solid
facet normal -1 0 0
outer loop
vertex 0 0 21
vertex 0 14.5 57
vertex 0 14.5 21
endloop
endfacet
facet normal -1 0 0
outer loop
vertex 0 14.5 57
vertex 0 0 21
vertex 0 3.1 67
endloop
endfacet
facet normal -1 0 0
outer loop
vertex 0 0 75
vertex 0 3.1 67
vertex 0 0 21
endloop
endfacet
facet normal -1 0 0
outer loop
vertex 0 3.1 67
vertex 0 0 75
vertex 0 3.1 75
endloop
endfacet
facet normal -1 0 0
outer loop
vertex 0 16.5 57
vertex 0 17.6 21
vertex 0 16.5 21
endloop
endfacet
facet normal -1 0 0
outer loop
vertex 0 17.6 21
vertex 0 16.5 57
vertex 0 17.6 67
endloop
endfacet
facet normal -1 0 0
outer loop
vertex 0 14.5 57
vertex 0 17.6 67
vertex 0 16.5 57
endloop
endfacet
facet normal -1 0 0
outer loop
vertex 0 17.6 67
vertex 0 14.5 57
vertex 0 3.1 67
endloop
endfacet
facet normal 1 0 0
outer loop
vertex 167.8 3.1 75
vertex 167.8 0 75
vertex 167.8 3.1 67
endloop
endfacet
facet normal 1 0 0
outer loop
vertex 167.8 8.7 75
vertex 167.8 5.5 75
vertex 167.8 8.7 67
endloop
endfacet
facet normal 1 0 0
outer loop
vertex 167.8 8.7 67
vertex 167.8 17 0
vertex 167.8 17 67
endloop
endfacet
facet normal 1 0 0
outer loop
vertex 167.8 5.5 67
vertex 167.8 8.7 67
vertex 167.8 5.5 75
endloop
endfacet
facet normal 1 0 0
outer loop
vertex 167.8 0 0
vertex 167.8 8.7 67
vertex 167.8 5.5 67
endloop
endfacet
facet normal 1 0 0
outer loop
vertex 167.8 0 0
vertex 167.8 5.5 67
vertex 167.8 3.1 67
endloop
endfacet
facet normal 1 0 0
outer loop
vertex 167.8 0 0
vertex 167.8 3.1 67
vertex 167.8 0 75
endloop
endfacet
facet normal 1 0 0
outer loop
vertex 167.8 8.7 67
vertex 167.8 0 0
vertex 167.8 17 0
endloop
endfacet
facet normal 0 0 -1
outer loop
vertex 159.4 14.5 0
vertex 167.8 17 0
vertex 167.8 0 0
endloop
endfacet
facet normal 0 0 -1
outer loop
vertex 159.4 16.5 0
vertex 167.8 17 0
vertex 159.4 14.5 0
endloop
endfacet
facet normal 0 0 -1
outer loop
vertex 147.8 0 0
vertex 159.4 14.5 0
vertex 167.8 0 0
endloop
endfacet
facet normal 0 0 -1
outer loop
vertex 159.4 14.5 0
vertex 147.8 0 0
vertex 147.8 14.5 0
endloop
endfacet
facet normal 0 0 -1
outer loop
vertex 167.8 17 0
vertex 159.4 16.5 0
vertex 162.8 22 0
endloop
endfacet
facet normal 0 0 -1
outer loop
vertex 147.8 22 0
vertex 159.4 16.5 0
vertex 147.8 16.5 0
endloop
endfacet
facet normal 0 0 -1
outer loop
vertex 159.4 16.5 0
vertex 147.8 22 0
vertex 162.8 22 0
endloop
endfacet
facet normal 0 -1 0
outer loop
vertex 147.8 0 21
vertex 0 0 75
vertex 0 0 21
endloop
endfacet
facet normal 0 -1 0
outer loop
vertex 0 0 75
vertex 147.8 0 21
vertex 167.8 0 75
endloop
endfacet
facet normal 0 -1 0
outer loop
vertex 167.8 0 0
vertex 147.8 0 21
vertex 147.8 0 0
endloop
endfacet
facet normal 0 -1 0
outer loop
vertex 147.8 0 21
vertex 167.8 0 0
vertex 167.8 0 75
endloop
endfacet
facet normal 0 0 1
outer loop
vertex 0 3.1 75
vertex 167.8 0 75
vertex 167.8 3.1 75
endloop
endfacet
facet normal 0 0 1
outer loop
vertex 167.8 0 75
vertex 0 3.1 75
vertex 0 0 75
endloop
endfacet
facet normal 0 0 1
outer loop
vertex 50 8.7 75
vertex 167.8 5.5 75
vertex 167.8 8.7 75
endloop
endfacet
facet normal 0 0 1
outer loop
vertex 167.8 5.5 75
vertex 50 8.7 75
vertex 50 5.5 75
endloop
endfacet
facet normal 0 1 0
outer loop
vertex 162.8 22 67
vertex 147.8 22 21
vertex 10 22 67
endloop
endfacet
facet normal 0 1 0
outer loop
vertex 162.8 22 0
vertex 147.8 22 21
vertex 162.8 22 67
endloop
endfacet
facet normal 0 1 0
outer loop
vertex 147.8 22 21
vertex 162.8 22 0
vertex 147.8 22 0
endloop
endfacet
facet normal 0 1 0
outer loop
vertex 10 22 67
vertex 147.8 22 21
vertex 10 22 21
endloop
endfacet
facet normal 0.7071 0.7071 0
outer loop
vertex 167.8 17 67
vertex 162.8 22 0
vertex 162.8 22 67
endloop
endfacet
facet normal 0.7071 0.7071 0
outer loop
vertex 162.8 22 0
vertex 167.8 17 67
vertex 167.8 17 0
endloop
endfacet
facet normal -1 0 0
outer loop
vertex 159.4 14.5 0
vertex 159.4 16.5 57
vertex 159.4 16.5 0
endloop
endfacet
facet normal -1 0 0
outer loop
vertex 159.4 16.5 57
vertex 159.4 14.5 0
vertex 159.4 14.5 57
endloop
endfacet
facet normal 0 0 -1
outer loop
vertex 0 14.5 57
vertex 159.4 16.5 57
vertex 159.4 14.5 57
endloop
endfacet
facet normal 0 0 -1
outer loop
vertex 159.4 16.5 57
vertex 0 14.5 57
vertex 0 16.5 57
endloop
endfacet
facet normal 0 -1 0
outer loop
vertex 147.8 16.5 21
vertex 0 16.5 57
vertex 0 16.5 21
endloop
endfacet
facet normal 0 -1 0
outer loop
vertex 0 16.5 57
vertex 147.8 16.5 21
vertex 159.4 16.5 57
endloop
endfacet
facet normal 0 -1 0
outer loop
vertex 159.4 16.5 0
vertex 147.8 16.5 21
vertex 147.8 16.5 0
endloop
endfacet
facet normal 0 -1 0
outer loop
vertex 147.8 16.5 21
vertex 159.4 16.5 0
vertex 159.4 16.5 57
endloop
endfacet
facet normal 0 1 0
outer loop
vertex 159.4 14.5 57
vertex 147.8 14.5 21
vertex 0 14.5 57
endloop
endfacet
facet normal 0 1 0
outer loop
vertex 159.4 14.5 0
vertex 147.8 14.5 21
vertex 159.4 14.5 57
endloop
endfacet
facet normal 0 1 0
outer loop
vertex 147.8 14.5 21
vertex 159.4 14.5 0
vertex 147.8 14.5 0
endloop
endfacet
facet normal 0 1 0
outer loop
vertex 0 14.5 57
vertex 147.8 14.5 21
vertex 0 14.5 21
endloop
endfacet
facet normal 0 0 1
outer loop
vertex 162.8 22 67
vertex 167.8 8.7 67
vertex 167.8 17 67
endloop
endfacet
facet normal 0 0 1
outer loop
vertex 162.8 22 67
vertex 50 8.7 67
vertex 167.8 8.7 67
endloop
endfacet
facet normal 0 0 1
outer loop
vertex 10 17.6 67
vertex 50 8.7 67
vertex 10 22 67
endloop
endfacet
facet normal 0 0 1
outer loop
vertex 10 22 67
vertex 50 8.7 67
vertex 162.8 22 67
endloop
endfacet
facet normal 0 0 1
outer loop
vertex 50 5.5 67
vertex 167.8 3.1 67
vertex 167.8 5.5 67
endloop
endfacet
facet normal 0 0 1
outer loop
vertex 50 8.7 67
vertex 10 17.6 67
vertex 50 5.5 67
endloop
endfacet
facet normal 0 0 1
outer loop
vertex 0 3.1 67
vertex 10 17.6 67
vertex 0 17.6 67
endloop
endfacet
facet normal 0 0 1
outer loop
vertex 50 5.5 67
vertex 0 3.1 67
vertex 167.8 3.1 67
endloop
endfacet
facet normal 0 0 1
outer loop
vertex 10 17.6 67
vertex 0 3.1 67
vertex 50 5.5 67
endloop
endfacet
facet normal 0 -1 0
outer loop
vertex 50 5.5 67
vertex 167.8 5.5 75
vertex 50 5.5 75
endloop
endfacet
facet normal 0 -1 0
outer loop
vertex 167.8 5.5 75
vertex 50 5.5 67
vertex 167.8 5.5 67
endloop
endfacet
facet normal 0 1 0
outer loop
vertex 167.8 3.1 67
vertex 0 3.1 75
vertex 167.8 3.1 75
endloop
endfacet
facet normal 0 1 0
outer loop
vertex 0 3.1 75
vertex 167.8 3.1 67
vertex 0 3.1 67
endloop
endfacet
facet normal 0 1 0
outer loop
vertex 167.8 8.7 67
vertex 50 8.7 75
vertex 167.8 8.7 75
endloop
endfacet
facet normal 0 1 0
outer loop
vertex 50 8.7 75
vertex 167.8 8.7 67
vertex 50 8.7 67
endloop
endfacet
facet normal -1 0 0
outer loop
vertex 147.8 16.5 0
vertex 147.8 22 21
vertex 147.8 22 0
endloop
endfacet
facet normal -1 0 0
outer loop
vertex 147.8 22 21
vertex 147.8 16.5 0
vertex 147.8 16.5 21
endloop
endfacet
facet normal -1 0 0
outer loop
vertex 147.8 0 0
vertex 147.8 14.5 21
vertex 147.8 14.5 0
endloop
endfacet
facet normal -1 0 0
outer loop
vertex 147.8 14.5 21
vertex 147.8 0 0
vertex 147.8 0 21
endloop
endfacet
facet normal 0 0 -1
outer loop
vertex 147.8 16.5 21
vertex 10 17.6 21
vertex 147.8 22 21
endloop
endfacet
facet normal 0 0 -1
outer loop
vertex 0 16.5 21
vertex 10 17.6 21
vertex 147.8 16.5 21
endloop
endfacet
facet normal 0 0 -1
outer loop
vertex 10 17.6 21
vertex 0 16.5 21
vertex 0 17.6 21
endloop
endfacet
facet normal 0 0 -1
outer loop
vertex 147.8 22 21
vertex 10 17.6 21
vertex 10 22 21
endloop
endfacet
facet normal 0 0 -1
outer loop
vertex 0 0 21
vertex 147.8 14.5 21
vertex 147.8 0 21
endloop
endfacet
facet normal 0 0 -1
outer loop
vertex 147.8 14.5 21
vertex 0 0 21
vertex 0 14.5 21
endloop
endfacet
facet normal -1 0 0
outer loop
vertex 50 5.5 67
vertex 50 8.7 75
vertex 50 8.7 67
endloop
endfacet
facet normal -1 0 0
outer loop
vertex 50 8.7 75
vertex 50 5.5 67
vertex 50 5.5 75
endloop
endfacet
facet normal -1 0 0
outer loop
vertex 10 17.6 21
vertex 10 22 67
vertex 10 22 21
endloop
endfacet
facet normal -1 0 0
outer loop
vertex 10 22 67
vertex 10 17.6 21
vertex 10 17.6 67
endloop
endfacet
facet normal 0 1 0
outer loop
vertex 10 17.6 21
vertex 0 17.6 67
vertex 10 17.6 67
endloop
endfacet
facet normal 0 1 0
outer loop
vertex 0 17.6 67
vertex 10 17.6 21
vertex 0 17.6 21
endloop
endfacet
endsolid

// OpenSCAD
thick = 1.6;
flap = 8;
spacing = 0.2;
W = 140;
H = 250;

pillarH = 290;
pillarRW = 20;
pillarRD = 22;
pillarLW = flap + thick * 4 + spacing;
pillarLD = 39;
pillarLDoff = 3.5;

railDrear = 16.5;
railD = 2.4;
railH = 10;

guideW = 5;
guideH = 130;

//panelBottom();
//panelMid();
//panelTop();
// pillarL(290, 0);
// pillarL(290, 1);
//pillarL(290, 2);
//pillarR(290, 1);
//pillarR(290, 0); // x2
top();

module panelBottom() {
    translate([0, 0, -24])
        cube([W + flap * 2, thick, 24]);
    difference() {
        panelBase(160 + thick);
        rotate([0, 90, 0])
            linear_extrude(W + flap * 2)
                polygon([[-160, 0], [-160 - thick, thick], [-160 - thick, 0]]);
        translate([W / 2, thick, 0])
            cube([W, 100, railH]);
        translate([flap + (W - 110) / 2, 0, railH + thick * 2 + 10])
            cube([110, thick, 110]);
    }
    translate([flap + thick * 4, thick, railH])
        cube([W - thick * 8, thick * 2, thick * 2]);
}

module panelMid() {
    difference() {
        panelBase(290 + thick);
        rotate([0, 90, 0]) {
            linear_extrude(W + flap * 2) {
                polygon([[0, 0], [-thick, thick], [-thick, flap + thick], [0, flap + thick]]);
                polygon([[-290, 0], [-290 - thick, thick], [-290 - thick, 0]]);
            }
        }
    }
}

module panelTop() {
   difference() {
        panelBase(160 + thick);
        rotate([0, 90, 0])
            linear_extrude(W + flap * 2)
                polygon([[0, 0], [-thick, thick], [-thick, flap + thick], [0, flap + thick]]);
        translate([0, thick, 110])
            cube([300, 100, 100]);
    }
}

module panelBase(h) {
    linear_extrude(h)
        polygon([[0, 0], [W + flap * 2, 0], [W + flap * 2, thick + flap], [W + flap, thick], [flap, thick], [0, thick + flap]]);
}

module pillarR(h, bottom) {
    difference() {
        pillarBase(pillarRW, pillarRD, h, thick * 2, pillarRD - 5.5);
        translate([0, pillarRD * .75, h - 5])
            cube([pillarRW, pillarRD * .25, 5]);
        if (bottom) {
            translate([0, pillarRD - railDrear - railD, 0])
                cube([pillarRW, railD, railH]);
        } else {
            cube([pillarRW, pillarRD * .75 + spacing, 5]);
        }
    }
    if (bottom) {
        translate([0, 0, railH])
            linear_extrude(guideH)
                polygon([[-guideW, 0], [0, 0], [0, guideW]]);
    }
}

module pillarL(h, zi) {
    difference() {
        translate([pillarLW, 0, 0])
            mirror([-1, 0, 0])
                pillarBase(pillarLW, pillarLD, h, thick, pillarLD - 5.5 + pillarLDoff);
        translate([thick * 2, 0, 0])
            cube([pillarLW, pillarLD - pillarRD + pillarLDoff, h]);
        if (zi == 2)
            translate([0, 0, 220])
                cube([thick * 2, 10, 80]);

    }
    if (zi == 0)
        linear_extrude(guideH)
            polygon([[pillarLW, pillarLD - pillarRD + pillarLDoff], [pillarLW + guideW, pillarLD - pillarRD + pillarLDoff], [pillarLW, pillarLD - pillarRD + pillarLDoff + guideW]]);
}

module pillarBase(w, d, h, c, doff) {
    linear_extrude(h)
        polygon([[0, 0], [w, 0], [w, d - c], [w - c, d], [c, d], [0, d - c],
                [0, doff], [thick * 2 + flap + spacing * 2, doff],
                [thick * 2 + flap + spacing * 2, doff - thick - flap - spacing * 2],
                [thick * 2 + flap, doff - thick - flap - spacing * 2],
                [thick * 2, doff - thick - spacing * 2],
                [0, doff - thick - spacing * 2]]);
}

module top() {
    w = pillarRW + W + pillarLW - 2 * (thick * 2 + spacing);
    h = 67;
    difference() {
        linear_extrude(h + 8)
            polygon([[0, 0], [w, 0], [w, pillarRD - 5], [w - 5, pillarRD], [0, pillarRD]]);
        translate([0, pillarRD - 5.5 - thick - spacing * 2, 0])
            cube([w - pillarRW + thick * 2 + flap + spacing * 2, thick + spacing * 2, h - 10]);
        translate([0, pillarRD - railDrear - railD, h])
            cube([w, railD, 100]);
        translate([0, pillarRD - railDrear + thick * 2, h])
            cube([w, 100, 100]);
        cube([w - pillarRW, pillarRD, 21]);
        translate([0, pillarRD - railDrear - railD, h])
            cube([50, pillarRD, 100]);
        translate([0, pillarRD - thick * 3 + spacing * 2, 0])
            cube([10, 100, h]);
    }
}
